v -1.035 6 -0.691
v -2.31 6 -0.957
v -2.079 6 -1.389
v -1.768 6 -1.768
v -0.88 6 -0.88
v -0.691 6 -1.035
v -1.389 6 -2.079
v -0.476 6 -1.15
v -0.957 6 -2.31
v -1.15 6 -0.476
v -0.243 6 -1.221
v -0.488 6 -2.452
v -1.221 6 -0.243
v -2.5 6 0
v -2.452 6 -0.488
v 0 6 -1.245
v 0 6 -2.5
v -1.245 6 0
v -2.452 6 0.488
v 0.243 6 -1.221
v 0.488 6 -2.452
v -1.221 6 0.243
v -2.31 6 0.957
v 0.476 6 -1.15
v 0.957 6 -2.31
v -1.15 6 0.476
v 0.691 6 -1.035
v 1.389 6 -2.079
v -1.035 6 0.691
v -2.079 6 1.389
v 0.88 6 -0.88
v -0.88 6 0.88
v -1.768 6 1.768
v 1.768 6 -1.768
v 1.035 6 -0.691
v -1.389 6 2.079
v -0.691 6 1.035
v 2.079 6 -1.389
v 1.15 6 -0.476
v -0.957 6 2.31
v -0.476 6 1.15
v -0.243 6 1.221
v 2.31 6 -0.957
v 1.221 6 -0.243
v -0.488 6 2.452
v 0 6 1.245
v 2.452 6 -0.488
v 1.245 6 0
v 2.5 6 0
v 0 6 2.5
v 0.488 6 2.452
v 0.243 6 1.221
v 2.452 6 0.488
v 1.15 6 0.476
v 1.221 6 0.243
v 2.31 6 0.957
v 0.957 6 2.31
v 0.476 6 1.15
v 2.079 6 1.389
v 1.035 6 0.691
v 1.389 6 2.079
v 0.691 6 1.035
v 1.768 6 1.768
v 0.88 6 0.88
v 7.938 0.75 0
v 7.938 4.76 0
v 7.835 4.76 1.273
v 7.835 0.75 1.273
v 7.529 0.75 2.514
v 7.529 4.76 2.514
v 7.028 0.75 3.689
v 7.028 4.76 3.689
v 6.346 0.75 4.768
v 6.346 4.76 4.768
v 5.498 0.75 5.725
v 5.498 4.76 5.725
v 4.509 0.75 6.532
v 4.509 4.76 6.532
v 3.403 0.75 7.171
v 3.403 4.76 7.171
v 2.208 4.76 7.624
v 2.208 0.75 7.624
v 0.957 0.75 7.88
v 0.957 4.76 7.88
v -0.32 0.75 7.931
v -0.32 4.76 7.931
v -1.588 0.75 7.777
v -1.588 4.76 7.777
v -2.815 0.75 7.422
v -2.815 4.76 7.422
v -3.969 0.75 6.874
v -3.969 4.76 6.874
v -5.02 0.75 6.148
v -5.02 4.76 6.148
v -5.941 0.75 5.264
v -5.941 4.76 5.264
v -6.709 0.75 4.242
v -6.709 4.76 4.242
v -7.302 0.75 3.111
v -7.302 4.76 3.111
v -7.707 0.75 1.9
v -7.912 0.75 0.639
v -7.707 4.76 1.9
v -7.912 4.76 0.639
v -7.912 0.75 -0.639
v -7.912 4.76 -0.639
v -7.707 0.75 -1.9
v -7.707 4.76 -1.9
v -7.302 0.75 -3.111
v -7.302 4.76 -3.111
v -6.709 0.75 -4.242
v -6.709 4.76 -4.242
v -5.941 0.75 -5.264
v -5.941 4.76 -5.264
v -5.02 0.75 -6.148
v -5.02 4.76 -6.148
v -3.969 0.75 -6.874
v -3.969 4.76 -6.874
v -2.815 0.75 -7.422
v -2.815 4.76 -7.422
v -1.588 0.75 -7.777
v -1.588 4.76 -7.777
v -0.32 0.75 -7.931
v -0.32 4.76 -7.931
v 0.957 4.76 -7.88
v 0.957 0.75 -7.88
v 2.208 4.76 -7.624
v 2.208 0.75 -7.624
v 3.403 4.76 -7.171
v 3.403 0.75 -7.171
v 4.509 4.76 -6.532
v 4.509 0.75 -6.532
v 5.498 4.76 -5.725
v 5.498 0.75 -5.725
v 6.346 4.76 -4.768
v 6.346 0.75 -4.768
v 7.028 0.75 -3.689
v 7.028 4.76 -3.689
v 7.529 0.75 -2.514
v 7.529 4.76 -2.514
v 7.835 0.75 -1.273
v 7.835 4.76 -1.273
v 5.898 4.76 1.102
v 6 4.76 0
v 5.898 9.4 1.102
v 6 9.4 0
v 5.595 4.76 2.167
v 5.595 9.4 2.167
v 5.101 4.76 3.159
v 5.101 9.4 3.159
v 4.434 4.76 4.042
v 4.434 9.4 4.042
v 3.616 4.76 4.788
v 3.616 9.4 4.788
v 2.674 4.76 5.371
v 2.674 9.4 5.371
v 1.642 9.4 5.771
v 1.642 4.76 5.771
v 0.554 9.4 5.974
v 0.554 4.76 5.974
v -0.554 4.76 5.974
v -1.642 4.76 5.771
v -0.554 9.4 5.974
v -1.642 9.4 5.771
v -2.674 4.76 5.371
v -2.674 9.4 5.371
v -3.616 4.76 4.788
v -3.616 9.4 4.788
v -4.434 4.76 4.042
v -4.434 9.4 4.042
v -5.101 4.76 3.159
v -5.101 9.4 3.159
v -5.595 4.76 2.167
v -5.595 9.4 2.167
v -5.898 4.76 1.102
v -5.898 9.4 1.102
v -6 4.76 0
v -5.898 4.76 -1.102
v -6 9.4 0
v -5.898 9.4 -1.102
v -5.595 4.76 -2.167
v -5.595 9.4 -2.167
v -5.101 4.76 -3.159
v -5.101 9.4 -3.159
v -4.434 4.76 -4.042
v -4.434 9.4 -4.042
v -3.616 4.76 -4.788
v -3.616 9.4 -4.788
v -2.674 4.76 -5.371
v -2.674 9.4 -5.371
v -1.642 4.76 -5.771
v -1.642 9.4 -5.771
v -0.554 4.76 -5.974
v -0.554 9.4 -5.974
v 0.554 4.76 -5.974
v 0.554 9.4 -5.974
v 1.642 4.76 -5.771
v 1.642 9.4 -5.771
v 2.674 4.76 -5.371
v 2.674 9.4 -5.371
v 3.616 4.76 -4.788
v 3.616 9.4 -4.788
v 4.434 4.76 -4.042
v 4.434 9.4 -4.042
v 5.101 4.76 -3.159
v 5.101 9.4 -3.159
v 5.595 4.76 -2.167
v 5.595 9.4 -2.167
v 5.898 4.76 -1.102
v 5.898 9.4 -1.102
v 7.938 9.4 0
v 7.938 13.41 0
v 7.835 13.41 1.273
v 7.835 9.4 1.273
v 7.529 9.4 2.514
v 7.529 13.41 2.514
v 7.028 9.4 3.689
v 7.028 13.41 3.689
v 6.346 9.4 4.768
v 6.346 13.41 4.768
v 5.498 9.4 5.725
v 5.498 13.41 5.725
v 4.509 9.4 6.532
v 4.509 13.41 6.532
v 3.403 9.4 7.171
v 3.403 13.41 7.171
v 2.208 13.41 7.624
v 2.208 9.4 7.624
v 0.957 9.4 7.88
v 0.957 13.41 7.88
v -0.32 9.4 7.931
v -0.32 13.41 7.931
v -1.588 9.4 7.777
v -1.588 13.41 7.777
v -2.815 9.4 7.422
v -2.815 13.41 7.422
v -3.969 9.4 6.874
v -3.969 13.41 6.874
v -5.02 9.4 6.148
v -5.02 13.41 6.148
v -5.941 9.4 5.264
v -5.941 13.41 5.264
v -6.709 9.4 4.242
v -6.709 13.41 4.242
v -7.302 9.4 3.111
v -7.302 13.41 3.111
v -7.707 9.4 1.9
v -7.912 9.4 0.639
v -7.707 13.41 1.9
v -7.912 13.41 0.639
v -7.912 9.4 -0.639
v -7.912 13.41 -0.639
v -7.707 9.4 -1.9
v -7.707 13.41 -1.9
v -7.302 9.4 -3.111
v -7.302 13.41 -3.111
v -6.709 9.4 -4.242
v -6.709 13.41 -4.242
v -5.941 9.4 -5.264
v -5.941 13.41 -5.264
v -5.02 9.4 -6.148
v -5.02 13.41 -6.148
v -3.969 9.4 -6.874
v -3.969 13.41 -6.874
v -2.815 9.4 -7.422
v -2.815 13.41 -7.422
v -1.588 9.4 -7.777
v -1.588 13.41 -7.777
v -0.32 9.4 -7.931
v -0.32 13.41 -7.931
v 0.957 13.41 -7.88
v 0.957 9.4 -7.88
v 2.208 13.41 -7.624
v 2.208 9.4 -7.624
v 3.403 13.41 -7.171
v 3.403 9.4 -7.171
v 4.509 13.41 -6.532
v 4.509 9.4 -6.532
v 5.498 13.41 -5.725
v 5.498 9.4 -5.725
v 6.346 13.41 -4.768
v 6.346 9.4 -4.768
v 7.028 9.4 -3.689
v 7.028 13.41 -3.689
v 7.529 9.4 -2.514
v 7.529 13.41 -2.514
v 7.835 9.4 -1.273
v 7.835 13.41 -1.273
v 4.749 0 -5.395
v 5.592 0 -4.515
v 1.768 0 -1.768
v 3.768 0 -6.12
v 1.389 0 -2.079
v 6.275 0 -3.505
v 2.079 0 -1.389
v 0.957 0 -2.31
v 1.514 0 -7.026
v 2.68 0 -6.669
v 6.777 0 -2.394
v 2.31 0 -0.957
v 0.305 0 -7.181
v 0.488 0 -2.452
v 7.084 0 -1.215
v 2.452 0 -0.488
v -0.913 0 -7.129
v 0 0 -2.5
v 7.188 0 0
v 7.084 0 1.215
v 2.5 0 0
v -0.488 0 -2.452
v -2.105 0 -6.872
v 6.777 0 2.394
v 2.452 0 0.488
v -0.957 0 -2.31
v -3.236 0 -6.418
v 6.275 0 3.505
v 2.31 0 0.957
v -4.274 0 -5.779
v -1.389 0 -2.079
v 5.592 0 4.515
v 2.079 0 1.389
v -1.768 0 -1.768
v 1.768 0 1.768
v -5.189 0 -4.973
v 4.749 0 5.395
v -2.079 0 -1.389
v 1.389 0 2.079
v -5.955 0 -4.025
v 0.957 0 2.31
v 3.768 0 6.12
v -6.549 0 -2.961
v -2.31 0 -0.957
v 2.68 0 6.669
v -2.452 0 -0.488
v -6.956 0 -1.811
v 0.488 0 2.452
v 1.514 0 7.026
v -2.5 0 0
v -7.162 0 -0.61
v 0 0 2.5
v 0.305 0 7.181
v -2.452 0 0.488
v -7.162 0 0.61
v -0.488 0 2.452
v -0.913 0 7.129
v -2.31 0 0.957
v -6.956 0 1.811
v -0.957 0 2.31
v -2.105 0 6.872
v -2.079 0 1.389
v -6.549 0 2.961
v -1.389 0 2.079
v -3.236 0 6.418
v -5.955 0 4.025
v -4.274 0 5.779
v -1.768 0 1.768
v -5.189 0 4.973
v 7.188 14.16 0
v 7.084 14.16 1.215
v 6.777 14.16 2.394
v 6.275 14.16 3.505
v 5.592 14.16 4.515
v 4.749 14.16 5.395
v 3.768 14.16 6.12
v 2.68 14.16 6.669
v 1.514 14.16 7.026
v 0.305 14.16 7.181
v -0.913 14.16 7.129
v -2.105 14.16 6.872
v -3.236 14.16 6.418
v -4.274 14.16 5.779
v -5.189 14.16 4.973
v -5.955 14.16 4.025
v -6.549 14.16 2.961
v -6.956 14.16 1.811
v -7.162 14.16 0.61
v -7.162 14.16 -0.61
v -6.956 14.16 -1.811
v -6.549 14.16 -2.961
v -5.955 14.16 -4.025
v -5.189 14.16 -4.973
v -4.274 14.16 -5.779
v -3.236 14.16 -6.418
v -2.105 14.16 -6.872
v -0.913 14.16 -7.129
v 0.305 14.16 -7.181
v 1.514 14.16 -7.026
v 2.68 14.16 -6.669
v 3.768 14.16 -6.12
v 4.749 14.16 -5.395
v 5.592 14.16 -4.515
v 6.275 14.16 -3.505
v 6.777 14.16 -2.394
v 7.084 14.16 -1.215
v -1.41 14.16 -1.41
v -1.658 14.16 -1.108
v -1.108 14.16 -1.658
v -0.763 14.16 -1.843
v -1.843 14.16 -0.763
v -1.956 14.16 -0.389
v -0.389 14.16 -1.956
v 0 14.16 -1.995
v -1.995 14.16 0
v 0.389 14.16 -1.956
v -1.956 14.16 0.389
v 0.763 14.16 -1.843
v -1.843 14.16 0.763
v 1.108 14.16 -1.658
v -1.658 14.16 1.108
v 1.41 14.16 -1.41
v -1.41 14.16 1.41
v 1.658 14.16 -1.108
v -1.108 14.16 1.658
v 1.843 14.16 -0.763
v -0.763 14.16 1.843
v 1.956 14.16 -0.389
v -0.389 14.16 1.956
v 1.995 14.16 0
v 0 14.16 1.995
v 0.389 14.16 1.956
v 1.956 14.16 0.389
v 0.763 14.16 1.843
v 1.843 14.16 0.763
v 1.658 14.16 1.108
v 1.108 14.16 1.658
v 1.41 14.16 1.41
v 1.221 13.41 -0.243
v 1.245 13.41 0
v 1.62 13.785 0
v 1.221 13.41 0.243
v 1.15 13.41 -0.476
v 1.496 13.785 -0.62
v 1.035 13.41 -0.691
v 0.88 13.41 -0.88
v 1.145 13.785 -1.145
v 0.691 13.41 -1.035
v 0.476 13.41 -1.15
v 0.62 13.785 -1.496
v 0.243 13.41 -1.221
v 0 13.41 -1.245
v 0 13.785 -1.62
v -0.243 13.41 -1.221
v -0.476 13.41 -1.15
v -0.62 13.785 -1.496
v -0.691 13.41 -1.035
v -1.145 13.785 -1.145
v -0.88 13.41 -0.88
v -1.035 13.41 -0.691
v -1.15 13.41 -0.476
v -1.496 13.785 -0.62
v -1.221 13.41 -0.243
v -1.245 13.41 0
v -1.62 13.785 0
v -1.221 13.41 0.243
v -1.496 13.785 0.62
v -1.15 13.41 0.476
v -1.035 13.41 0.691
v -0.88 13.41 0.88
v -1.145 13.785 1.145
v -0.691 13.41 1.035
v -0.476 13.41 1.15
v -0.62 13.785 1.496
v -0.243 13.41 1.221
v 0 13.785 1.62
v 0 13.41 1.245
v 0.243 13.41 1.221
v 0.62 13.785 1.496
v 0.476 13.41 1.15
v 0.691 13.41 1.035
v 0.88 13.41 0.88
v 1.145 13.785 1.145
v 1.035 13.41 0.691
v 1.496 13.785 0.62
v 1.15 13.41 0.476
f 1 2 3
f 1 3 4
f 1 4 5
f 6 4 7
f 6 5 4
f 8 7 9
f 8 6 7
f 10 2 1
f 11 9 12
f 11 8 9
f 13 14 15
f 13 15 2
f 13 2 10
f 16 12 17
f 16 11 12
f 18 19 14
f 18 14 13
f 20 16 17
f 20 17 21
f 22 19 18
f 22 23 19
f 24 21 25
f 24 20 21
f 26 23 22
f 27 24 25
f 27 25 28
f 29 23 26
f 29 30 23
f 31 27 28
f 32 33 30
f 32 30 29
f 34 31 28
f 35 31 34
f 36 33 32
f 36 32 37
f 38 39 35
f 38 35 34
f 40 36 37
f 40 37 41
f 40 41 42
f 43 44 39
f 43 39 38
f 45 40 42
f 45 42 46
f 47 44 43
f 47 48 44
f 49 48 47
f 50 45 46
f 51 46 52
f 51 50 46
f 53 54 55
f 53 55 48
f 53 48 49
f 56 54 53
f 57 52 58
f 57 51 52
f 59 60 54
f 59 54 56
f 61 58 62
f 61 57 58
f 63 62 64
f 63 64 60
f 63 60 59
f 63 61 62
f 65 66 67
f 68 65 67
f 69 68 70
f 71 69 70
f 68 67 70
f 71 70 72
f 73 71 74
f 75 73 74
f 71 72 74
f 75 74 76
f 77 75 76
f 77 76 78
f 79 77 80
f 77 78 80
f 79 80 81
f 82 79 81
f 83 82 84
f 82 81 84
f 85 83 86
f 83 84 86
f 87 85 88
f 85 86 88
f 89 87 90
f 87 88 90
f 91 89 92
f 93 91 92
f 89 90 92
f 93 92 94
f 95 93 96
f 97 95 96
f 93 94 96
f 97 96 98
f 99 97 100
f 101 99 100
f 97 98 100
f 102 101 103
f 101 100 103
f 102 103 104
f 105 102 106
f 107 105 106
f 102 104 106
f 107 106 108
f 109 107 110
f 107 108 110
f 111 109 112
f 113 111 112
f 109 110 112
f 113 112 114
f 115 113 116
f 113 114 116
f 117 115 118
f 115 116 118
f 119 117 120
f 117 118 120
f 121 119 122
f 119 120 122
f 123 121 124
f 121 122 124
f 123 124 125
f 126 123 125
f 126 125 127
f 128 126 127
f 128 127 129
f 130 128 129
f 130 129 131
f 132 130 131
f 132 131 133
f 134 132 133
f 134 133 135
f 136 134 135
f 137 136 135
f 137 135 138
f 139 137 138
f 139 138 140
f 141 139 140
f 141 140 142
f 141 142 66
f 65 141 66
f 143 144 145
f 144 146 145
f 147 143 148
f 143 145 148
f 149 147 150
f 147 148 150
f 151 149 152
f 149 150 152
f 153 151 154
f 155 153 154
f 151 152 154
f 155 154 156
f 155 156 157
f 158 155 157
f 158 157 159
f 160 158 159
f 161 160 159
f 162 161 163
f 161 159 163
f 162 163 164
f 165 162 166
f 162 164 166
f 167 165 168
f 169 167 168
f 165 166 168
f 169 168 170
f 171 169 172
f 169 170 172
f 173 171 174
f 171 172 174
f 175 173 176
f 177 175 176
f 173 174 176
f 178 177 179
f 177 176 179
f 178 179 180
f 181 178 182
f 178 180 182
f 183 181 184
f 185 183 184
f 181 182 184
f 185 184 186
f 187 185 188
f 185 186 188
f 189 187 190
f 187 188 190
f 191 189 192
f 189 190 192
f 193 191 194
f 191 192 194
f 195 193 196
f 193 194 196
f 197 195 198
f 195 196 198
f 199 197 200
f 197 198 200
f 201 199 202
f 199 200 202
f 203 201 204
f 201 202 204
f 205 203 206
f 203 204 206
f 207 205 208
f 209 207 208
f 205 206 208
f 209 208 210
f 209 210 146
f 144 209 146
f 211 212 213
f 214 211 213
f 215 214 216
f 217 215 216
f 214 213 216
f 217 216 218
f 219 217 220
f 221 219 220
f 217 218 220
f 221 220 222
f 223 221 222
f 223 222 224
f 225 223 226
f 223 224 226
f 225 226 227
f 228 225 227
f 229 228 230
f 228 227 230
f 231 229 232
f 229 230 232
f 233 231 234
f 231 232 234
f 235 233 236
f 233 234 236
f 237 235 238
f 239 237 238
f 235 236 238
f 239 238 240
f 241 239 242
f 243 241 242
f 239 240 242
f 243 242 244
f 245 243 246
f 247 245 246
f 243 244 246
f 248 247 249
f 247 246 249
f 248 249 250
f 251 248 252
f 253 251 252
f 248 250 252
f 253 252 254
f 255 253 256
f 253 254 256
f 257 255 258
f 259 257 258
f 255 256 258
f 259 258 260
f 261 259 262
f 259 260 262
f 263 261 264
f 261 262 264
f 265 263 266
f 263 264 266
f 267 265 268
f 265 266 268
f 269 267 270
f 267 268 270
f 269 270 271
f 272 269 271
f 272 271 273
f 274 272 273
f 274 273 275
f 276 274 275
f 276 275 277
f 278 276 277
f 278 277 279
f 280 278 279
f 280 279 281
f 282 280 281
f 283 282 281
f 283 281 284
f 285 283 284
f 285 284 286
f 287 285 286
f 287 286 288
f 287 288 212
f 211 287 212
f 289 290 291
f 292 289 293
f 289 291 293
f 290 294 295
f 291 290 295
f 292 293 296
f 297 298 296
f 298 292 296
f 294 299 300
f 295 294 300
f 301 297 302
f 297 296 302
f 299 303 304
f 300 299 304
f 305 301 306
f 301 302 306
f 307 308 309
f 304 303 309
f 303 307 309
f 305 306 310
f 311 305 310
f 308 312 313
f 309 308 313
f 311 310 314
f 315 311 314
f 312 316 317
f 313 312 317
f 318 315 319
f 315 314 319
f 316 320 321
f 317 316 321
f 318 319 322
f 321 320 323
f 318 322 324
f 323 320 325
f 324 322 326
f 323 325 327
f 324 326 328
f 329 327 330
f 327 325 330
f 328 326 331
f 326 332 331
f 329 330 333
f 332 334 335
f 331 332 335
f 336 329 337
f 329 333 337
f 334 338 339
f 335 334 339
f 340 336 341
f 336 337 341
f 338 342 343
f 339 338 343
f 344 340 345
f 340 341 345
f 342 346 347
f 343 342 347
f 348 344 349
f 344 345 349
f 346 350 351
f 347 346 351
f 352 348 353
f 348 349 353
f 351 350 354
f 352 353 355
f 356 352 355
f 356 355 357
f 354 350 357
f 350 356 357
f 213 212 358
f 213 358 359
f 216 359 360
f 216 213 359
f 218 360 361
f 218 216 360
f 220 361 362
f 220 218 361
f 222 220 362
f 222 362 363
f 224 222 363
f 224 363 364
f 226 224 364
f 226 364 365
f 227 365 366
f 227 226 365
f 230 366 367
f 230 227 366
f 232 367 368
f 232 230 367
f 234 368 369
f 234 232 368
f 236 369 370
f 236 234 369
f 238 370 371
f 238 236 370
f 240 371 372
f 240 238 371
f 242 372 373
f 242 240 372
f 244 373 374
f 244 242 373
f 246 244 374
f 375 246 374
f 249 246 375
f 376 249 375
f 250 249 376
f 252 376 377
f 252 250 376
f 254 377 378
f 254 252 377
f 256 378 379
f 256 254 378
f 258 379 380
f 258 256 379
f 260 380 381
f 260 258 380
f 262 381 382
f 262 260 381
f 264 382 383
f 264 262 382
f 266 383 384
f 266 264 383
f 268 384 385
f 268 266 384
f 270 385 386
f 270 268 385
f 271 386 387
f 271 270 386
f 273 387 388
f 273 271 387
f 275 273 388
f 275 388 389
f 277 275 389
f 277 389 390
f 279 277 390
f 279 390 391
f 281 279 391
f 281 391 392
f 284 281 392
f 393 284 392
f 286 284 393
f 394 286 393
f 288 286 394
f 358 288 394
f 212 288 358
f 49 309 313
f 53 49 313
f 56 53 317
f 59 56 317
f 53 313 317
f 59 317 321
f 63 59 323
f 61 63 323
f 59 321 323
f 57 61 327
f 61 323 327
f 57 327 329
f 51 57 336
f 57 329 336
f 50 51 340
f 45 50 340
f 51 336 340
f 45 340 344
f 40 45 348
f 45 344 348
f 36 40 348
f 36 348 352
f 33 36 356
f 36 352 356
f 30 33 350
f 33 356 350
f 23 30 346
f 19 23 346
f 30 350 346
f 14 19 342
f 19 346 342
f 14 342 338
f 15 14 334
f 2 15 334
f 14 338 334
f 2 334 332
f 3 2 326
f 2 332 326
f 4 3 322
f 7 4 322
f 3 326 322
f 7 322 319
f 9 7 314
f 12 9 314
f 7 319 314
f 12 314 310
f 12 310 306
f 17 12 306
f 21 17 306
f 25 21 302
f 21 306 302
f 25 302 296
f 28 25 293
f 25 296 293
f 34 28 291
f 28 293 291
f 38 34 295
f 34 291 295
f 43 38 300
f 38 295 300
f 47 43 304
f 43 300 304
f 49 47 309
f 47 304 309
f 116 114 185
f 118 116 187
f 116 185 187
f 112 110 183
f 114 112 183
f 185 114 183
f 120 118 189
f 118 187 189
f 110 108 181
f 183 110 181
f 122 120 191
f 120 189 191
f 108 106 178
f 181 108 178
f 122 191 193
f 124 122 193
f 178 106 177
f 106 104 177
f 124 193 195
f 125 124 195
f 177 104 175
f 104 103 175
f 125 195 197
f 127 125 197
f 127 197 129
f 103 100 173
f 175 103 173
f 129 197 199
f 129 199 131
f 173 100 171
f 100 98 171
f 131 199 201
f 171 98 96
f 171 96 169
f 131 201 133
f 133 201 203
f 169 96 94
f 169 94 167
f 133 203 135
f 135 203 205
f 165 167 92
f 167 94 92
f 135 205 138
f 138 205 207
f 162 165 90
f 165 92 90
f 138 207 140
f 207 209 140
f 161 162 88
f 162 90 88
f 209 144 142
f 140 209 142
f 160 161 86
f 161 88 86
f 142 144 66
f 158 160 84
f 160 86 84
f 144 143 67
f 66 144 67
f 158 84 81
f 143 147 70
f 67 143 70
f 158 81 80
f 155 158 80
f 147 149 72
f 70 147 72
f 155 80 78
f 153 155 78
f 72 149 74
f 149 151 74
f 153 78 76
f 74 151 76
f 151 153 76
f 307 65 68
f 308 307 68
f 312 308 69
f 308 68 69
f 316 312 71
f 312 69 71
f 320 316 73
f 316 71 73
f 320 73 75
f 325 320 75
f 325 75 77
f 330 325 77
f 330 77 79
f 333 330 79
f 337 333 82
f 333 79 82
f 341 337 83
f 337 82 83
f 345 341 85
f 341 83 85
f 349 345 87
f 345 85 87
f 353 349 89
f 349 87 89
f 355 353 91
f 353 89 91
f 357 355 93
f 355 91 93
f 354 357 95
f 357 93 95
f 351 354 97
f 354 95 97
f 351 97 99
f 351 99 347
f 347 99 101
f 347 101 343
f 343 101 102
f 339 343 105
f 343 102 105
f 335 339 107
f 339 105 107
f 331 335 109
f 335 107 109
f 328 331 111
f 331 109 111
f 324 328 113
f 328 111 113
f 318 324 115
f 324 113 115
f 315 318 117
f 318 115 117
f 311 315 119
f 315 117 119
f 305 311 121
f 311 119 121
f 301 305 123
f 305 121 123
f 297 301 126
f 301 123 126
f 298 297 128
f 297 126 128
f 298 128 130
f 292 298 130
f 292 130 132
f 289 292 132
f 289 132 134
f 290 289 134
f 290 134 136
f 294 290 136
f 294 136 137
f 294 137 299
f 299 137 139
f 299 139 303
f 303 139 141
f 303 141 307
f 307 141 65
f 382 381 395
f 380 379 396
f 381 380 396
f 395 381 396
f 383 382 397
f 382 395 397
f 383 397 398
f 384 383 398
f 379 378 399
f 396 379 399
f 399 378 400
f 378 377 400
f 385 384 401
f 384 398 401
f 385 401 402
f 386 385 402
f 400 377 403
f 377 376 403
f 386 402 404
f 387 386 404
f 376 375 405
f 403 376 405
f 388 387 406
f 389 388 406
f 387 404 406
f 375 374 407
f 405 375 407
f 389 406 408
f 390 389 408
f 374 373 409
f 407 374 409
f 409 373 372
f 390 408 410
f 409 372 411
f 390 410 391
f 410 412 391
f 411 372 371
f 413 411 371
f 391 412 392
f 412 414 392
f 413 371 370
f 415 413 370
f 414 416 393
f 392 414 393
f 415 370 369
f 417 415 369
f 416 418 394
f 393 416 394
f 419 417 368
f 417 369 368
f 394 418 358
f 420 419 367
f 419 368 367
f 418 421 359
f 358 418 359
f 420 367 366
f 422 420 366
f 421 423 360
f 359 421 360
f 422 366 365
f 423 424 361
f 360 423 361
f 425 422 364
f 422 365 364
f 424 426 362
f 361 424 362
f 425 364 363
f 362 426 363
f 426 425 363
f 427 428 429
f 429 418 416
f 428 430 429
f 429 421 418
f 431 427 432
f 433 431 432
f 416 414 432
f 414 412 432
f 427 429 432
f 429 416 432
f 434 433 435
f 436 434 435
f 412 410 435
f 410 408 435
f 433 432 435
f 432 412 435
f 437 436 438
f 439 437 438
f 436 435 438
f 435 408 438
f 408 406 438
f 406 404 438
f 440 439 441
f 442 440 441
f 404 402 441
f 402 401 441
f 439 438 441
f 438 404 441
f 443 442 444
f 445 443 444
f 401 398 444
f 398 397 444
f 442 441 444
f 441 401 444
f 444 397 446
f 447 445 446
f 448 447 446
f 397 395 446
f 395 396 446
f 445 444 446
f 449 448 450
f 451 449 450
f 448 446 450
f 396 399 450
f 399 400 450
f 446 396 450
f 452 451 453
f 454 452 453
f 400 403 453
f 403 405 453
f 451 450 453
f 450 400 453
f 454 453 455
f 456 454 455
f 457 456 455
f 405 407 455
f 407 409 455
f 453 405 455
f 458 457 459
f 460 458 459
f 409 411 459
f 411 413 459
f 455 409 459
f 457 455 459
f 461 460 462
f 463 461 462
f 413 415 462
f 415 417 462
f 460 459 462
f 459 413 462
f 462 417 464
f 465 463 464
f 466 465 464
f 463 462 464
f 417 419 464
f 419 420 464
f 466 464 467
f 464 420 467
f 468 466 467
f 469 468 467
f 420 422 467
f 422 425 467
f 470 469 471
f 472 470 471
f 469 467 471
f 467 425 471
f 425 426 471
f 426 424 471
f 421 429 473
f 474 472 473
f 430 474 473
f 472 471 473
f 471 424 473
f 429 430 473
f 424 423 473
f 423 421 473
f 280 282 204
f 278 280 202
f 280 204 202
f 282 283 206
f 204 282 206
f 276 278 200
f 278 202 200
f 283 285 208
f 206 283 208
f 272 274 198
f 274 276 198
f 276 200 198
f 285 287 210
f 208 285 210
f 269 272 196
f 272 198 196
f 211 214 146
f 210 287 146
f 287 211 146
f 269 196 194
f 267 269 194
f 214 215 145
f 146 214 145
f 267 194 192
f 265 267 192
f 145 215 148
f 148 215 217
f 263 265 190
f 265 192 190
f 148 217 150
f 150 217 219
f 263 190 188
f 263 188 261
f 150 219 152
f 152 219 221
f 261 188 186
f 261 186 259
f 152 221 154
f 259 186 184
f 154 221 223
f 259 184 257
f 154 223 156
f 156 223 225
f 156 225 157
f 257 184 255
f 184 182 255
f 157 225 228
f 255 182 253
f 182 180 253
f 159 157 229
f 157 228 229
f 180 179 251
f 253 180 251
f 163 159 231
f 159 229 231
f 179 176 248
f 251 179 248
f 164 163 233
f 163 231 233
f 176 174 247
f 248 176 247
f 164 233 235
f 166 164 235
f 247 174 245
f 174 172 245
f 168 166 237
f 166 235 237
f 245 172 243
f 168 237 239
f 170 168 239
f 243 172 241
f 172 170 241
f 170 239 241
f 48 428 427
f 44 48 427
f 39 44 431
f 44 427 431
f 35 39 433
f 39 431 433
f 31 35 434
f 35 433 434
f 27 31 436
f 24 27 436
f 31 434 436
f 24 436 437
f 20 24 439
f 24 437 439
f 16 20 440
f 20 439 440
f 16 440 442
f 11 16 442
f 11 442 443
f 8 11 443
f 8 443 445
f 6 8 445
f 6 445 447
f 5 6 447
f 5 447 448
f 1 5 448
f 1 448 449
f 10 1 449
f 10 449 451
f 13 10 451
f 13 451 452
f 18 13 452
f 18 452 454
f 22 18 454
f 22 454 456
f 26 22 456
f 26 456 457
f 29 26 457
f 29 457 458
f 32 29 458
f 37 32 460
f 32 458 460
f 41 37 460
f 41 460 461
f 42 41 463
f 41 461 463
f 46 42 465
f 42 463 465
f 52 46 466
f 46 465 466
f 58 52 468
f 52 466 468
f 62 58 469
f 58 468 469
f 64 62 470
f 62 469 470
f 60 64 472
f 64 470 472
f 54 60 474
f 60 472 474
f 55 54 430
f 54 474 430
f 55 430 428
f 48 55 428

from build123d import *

# Parameters (mm, degrees)
SKETCH2_R          = 1.2446
CUT_EXTRUDE1_DEPTH = 15.16
SKETCH4_R          = 2.5
CUT_EXTRUDE3_DEPTH = 6
CHAMFER1_SIZE      = 0.75


with BuildPart() as part:
    # Sketch1 → Revolve1 (revolve)
    with BuildSketch(Plane.XY):
        Polygon((0, 14.16), (0, 0), (7.9375, 0), (7.9375, 4.76), (6, 4.76), (6, 9.4), (7.9375, 9.4), (7.9375, 14.16), align=None)
    revolve(axis=Axis((0, 14.16, 0), (0, -1, 0)))

    # Sketch2 → Cut-Extrude1 (cut, through all)
    with BuildSketch(Plane(origin=(0, 14.16, 0), x_dir=(1, 0, 0), z_dir=(0, 1, 0))):
        Circle(SKETCH2_R)
    extrude(amount=-CUT_EXTRUDE1_DEPTH, mode=Mode.SUBTRACT)

    # Sketch4 → Cut-Extrude3 (cut)
    with BuildSketch(Plane.XZ):
        Circle(SKETCH4_R)
    extrude(amount=-CUT_EXTRUDE3_DEPTH, mode=Mode.SUBTRACT)

    # Chamfer1
    chamfer1_edges = [part.edges().sort_by_distance(p)[0] for p in [
        (-1.2446, 14.16, 0),
        (-7.9375, 14.16, 0),
        (-7.9375, 0, 0),
    ]]
    chamfer(chamfer1_edges, length=CHAMFER1_SIZE)


solid = part.part
